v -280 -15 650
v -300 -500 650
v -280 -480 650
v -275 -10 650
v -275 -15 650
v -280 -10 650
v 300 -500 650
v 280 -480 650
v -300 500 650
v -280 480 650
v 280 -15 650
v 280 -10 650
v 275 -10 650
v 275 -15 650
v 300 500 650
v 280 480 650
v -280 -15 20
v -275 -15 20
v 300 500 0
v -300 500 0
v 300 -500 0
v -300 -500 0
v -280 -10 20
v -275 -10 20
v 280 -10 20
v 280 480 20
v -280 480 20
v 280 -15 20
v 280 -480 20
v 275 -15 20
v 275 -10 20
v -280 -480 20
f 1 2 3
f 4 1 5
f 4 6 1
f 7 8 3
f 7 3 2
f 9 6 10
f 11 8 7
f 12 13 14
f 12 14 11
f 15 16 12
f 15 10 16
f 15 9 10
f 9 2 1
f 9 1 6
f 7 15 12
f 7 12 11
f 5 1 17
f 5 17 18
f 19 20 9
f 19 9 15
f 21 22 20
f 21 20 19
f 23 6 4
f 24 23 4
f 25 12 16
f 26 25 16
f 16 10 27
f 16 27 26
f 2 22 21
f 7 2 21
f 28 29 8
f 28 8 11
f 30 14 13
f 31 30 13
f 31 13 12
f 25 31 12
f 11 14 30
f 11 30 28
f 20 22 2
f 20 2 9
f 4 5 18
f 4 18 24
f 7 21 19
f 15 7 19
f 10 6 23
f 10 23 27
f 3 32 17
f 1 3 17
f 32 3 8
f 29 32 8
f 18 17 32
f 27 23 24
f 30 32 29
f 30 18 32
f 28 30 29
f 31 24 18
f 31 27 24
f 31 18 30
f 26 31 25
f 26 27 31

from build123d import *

# Parameters (mm, degrees)
SKETCH1_W           = 600
SKETCH1_H           = 1000
BOSS_EXTRUDE1_DEPTH = 650
SHELL1_T            = -20
BOSS_EXTRUDE2_REACH = 875.212
SKETCH2_W           = 5
SKETCH2_H           = 5


with BuildPart() as part:
    # Sketch1 → Boss-Extrude1 (new body)
    with BuildSketch(Plane.XY):
        Rectangle(SKETCH1_W, SKETCH1_H)
    extrude(amount=BOSS_EXTRUDE1_DEPTH)

    # Shell1
    shell1_openings = [part.faces().sort_by_distance(p)[0] for p in [
        (0, 0, 650),
    ]]
    offset(amount=SHELL1_T, openings=shell1_openings, kind=Kind.INTERSECTION)

    # Sketch2 → Boss-Extrude2 (add, up to next)
    with BuildSketch(Plane.XY.offset(650), mode=Mode.PRIVATE) as boss_extrude2_sk1:
        with Locations((-277.5, -12.5)):
            Rectangle(SKETCH2_W, SKETCH2_H)
    boss_extrude2_tool1 = extrude(boss_extrude2_sk1.sketch, amount=-BOSS_EXTRUDE2_REACH, mode=Mode.PRIVATE) - part.part
    # Sketch2 → Boss-Extrude2 (add, up to next)
    with BuildSketch(Plane.XY.offset(650), mode=Mode.PRIVATE) as boss_extrude2_sk2:
        with Locations((277.5, -12.5)):
            Rectangle(SKETCH2_W, SKETCH2_H)
    boss_extrude2_tool2 = extrude(boss_extrude2_sk2.sketch, amount=-BOSS_EXTRUDE2_REACH, mode=Mode.PRIVATE) - part.part
    add(boss_extrude2_tool1.solids().sort_by_distance((-277.5, -12.5, 650))[0])
    add(boss_extrude2_tool2.solids().sort_by_distance((277.5, -12.5, 650))[0])


solid = part.part
